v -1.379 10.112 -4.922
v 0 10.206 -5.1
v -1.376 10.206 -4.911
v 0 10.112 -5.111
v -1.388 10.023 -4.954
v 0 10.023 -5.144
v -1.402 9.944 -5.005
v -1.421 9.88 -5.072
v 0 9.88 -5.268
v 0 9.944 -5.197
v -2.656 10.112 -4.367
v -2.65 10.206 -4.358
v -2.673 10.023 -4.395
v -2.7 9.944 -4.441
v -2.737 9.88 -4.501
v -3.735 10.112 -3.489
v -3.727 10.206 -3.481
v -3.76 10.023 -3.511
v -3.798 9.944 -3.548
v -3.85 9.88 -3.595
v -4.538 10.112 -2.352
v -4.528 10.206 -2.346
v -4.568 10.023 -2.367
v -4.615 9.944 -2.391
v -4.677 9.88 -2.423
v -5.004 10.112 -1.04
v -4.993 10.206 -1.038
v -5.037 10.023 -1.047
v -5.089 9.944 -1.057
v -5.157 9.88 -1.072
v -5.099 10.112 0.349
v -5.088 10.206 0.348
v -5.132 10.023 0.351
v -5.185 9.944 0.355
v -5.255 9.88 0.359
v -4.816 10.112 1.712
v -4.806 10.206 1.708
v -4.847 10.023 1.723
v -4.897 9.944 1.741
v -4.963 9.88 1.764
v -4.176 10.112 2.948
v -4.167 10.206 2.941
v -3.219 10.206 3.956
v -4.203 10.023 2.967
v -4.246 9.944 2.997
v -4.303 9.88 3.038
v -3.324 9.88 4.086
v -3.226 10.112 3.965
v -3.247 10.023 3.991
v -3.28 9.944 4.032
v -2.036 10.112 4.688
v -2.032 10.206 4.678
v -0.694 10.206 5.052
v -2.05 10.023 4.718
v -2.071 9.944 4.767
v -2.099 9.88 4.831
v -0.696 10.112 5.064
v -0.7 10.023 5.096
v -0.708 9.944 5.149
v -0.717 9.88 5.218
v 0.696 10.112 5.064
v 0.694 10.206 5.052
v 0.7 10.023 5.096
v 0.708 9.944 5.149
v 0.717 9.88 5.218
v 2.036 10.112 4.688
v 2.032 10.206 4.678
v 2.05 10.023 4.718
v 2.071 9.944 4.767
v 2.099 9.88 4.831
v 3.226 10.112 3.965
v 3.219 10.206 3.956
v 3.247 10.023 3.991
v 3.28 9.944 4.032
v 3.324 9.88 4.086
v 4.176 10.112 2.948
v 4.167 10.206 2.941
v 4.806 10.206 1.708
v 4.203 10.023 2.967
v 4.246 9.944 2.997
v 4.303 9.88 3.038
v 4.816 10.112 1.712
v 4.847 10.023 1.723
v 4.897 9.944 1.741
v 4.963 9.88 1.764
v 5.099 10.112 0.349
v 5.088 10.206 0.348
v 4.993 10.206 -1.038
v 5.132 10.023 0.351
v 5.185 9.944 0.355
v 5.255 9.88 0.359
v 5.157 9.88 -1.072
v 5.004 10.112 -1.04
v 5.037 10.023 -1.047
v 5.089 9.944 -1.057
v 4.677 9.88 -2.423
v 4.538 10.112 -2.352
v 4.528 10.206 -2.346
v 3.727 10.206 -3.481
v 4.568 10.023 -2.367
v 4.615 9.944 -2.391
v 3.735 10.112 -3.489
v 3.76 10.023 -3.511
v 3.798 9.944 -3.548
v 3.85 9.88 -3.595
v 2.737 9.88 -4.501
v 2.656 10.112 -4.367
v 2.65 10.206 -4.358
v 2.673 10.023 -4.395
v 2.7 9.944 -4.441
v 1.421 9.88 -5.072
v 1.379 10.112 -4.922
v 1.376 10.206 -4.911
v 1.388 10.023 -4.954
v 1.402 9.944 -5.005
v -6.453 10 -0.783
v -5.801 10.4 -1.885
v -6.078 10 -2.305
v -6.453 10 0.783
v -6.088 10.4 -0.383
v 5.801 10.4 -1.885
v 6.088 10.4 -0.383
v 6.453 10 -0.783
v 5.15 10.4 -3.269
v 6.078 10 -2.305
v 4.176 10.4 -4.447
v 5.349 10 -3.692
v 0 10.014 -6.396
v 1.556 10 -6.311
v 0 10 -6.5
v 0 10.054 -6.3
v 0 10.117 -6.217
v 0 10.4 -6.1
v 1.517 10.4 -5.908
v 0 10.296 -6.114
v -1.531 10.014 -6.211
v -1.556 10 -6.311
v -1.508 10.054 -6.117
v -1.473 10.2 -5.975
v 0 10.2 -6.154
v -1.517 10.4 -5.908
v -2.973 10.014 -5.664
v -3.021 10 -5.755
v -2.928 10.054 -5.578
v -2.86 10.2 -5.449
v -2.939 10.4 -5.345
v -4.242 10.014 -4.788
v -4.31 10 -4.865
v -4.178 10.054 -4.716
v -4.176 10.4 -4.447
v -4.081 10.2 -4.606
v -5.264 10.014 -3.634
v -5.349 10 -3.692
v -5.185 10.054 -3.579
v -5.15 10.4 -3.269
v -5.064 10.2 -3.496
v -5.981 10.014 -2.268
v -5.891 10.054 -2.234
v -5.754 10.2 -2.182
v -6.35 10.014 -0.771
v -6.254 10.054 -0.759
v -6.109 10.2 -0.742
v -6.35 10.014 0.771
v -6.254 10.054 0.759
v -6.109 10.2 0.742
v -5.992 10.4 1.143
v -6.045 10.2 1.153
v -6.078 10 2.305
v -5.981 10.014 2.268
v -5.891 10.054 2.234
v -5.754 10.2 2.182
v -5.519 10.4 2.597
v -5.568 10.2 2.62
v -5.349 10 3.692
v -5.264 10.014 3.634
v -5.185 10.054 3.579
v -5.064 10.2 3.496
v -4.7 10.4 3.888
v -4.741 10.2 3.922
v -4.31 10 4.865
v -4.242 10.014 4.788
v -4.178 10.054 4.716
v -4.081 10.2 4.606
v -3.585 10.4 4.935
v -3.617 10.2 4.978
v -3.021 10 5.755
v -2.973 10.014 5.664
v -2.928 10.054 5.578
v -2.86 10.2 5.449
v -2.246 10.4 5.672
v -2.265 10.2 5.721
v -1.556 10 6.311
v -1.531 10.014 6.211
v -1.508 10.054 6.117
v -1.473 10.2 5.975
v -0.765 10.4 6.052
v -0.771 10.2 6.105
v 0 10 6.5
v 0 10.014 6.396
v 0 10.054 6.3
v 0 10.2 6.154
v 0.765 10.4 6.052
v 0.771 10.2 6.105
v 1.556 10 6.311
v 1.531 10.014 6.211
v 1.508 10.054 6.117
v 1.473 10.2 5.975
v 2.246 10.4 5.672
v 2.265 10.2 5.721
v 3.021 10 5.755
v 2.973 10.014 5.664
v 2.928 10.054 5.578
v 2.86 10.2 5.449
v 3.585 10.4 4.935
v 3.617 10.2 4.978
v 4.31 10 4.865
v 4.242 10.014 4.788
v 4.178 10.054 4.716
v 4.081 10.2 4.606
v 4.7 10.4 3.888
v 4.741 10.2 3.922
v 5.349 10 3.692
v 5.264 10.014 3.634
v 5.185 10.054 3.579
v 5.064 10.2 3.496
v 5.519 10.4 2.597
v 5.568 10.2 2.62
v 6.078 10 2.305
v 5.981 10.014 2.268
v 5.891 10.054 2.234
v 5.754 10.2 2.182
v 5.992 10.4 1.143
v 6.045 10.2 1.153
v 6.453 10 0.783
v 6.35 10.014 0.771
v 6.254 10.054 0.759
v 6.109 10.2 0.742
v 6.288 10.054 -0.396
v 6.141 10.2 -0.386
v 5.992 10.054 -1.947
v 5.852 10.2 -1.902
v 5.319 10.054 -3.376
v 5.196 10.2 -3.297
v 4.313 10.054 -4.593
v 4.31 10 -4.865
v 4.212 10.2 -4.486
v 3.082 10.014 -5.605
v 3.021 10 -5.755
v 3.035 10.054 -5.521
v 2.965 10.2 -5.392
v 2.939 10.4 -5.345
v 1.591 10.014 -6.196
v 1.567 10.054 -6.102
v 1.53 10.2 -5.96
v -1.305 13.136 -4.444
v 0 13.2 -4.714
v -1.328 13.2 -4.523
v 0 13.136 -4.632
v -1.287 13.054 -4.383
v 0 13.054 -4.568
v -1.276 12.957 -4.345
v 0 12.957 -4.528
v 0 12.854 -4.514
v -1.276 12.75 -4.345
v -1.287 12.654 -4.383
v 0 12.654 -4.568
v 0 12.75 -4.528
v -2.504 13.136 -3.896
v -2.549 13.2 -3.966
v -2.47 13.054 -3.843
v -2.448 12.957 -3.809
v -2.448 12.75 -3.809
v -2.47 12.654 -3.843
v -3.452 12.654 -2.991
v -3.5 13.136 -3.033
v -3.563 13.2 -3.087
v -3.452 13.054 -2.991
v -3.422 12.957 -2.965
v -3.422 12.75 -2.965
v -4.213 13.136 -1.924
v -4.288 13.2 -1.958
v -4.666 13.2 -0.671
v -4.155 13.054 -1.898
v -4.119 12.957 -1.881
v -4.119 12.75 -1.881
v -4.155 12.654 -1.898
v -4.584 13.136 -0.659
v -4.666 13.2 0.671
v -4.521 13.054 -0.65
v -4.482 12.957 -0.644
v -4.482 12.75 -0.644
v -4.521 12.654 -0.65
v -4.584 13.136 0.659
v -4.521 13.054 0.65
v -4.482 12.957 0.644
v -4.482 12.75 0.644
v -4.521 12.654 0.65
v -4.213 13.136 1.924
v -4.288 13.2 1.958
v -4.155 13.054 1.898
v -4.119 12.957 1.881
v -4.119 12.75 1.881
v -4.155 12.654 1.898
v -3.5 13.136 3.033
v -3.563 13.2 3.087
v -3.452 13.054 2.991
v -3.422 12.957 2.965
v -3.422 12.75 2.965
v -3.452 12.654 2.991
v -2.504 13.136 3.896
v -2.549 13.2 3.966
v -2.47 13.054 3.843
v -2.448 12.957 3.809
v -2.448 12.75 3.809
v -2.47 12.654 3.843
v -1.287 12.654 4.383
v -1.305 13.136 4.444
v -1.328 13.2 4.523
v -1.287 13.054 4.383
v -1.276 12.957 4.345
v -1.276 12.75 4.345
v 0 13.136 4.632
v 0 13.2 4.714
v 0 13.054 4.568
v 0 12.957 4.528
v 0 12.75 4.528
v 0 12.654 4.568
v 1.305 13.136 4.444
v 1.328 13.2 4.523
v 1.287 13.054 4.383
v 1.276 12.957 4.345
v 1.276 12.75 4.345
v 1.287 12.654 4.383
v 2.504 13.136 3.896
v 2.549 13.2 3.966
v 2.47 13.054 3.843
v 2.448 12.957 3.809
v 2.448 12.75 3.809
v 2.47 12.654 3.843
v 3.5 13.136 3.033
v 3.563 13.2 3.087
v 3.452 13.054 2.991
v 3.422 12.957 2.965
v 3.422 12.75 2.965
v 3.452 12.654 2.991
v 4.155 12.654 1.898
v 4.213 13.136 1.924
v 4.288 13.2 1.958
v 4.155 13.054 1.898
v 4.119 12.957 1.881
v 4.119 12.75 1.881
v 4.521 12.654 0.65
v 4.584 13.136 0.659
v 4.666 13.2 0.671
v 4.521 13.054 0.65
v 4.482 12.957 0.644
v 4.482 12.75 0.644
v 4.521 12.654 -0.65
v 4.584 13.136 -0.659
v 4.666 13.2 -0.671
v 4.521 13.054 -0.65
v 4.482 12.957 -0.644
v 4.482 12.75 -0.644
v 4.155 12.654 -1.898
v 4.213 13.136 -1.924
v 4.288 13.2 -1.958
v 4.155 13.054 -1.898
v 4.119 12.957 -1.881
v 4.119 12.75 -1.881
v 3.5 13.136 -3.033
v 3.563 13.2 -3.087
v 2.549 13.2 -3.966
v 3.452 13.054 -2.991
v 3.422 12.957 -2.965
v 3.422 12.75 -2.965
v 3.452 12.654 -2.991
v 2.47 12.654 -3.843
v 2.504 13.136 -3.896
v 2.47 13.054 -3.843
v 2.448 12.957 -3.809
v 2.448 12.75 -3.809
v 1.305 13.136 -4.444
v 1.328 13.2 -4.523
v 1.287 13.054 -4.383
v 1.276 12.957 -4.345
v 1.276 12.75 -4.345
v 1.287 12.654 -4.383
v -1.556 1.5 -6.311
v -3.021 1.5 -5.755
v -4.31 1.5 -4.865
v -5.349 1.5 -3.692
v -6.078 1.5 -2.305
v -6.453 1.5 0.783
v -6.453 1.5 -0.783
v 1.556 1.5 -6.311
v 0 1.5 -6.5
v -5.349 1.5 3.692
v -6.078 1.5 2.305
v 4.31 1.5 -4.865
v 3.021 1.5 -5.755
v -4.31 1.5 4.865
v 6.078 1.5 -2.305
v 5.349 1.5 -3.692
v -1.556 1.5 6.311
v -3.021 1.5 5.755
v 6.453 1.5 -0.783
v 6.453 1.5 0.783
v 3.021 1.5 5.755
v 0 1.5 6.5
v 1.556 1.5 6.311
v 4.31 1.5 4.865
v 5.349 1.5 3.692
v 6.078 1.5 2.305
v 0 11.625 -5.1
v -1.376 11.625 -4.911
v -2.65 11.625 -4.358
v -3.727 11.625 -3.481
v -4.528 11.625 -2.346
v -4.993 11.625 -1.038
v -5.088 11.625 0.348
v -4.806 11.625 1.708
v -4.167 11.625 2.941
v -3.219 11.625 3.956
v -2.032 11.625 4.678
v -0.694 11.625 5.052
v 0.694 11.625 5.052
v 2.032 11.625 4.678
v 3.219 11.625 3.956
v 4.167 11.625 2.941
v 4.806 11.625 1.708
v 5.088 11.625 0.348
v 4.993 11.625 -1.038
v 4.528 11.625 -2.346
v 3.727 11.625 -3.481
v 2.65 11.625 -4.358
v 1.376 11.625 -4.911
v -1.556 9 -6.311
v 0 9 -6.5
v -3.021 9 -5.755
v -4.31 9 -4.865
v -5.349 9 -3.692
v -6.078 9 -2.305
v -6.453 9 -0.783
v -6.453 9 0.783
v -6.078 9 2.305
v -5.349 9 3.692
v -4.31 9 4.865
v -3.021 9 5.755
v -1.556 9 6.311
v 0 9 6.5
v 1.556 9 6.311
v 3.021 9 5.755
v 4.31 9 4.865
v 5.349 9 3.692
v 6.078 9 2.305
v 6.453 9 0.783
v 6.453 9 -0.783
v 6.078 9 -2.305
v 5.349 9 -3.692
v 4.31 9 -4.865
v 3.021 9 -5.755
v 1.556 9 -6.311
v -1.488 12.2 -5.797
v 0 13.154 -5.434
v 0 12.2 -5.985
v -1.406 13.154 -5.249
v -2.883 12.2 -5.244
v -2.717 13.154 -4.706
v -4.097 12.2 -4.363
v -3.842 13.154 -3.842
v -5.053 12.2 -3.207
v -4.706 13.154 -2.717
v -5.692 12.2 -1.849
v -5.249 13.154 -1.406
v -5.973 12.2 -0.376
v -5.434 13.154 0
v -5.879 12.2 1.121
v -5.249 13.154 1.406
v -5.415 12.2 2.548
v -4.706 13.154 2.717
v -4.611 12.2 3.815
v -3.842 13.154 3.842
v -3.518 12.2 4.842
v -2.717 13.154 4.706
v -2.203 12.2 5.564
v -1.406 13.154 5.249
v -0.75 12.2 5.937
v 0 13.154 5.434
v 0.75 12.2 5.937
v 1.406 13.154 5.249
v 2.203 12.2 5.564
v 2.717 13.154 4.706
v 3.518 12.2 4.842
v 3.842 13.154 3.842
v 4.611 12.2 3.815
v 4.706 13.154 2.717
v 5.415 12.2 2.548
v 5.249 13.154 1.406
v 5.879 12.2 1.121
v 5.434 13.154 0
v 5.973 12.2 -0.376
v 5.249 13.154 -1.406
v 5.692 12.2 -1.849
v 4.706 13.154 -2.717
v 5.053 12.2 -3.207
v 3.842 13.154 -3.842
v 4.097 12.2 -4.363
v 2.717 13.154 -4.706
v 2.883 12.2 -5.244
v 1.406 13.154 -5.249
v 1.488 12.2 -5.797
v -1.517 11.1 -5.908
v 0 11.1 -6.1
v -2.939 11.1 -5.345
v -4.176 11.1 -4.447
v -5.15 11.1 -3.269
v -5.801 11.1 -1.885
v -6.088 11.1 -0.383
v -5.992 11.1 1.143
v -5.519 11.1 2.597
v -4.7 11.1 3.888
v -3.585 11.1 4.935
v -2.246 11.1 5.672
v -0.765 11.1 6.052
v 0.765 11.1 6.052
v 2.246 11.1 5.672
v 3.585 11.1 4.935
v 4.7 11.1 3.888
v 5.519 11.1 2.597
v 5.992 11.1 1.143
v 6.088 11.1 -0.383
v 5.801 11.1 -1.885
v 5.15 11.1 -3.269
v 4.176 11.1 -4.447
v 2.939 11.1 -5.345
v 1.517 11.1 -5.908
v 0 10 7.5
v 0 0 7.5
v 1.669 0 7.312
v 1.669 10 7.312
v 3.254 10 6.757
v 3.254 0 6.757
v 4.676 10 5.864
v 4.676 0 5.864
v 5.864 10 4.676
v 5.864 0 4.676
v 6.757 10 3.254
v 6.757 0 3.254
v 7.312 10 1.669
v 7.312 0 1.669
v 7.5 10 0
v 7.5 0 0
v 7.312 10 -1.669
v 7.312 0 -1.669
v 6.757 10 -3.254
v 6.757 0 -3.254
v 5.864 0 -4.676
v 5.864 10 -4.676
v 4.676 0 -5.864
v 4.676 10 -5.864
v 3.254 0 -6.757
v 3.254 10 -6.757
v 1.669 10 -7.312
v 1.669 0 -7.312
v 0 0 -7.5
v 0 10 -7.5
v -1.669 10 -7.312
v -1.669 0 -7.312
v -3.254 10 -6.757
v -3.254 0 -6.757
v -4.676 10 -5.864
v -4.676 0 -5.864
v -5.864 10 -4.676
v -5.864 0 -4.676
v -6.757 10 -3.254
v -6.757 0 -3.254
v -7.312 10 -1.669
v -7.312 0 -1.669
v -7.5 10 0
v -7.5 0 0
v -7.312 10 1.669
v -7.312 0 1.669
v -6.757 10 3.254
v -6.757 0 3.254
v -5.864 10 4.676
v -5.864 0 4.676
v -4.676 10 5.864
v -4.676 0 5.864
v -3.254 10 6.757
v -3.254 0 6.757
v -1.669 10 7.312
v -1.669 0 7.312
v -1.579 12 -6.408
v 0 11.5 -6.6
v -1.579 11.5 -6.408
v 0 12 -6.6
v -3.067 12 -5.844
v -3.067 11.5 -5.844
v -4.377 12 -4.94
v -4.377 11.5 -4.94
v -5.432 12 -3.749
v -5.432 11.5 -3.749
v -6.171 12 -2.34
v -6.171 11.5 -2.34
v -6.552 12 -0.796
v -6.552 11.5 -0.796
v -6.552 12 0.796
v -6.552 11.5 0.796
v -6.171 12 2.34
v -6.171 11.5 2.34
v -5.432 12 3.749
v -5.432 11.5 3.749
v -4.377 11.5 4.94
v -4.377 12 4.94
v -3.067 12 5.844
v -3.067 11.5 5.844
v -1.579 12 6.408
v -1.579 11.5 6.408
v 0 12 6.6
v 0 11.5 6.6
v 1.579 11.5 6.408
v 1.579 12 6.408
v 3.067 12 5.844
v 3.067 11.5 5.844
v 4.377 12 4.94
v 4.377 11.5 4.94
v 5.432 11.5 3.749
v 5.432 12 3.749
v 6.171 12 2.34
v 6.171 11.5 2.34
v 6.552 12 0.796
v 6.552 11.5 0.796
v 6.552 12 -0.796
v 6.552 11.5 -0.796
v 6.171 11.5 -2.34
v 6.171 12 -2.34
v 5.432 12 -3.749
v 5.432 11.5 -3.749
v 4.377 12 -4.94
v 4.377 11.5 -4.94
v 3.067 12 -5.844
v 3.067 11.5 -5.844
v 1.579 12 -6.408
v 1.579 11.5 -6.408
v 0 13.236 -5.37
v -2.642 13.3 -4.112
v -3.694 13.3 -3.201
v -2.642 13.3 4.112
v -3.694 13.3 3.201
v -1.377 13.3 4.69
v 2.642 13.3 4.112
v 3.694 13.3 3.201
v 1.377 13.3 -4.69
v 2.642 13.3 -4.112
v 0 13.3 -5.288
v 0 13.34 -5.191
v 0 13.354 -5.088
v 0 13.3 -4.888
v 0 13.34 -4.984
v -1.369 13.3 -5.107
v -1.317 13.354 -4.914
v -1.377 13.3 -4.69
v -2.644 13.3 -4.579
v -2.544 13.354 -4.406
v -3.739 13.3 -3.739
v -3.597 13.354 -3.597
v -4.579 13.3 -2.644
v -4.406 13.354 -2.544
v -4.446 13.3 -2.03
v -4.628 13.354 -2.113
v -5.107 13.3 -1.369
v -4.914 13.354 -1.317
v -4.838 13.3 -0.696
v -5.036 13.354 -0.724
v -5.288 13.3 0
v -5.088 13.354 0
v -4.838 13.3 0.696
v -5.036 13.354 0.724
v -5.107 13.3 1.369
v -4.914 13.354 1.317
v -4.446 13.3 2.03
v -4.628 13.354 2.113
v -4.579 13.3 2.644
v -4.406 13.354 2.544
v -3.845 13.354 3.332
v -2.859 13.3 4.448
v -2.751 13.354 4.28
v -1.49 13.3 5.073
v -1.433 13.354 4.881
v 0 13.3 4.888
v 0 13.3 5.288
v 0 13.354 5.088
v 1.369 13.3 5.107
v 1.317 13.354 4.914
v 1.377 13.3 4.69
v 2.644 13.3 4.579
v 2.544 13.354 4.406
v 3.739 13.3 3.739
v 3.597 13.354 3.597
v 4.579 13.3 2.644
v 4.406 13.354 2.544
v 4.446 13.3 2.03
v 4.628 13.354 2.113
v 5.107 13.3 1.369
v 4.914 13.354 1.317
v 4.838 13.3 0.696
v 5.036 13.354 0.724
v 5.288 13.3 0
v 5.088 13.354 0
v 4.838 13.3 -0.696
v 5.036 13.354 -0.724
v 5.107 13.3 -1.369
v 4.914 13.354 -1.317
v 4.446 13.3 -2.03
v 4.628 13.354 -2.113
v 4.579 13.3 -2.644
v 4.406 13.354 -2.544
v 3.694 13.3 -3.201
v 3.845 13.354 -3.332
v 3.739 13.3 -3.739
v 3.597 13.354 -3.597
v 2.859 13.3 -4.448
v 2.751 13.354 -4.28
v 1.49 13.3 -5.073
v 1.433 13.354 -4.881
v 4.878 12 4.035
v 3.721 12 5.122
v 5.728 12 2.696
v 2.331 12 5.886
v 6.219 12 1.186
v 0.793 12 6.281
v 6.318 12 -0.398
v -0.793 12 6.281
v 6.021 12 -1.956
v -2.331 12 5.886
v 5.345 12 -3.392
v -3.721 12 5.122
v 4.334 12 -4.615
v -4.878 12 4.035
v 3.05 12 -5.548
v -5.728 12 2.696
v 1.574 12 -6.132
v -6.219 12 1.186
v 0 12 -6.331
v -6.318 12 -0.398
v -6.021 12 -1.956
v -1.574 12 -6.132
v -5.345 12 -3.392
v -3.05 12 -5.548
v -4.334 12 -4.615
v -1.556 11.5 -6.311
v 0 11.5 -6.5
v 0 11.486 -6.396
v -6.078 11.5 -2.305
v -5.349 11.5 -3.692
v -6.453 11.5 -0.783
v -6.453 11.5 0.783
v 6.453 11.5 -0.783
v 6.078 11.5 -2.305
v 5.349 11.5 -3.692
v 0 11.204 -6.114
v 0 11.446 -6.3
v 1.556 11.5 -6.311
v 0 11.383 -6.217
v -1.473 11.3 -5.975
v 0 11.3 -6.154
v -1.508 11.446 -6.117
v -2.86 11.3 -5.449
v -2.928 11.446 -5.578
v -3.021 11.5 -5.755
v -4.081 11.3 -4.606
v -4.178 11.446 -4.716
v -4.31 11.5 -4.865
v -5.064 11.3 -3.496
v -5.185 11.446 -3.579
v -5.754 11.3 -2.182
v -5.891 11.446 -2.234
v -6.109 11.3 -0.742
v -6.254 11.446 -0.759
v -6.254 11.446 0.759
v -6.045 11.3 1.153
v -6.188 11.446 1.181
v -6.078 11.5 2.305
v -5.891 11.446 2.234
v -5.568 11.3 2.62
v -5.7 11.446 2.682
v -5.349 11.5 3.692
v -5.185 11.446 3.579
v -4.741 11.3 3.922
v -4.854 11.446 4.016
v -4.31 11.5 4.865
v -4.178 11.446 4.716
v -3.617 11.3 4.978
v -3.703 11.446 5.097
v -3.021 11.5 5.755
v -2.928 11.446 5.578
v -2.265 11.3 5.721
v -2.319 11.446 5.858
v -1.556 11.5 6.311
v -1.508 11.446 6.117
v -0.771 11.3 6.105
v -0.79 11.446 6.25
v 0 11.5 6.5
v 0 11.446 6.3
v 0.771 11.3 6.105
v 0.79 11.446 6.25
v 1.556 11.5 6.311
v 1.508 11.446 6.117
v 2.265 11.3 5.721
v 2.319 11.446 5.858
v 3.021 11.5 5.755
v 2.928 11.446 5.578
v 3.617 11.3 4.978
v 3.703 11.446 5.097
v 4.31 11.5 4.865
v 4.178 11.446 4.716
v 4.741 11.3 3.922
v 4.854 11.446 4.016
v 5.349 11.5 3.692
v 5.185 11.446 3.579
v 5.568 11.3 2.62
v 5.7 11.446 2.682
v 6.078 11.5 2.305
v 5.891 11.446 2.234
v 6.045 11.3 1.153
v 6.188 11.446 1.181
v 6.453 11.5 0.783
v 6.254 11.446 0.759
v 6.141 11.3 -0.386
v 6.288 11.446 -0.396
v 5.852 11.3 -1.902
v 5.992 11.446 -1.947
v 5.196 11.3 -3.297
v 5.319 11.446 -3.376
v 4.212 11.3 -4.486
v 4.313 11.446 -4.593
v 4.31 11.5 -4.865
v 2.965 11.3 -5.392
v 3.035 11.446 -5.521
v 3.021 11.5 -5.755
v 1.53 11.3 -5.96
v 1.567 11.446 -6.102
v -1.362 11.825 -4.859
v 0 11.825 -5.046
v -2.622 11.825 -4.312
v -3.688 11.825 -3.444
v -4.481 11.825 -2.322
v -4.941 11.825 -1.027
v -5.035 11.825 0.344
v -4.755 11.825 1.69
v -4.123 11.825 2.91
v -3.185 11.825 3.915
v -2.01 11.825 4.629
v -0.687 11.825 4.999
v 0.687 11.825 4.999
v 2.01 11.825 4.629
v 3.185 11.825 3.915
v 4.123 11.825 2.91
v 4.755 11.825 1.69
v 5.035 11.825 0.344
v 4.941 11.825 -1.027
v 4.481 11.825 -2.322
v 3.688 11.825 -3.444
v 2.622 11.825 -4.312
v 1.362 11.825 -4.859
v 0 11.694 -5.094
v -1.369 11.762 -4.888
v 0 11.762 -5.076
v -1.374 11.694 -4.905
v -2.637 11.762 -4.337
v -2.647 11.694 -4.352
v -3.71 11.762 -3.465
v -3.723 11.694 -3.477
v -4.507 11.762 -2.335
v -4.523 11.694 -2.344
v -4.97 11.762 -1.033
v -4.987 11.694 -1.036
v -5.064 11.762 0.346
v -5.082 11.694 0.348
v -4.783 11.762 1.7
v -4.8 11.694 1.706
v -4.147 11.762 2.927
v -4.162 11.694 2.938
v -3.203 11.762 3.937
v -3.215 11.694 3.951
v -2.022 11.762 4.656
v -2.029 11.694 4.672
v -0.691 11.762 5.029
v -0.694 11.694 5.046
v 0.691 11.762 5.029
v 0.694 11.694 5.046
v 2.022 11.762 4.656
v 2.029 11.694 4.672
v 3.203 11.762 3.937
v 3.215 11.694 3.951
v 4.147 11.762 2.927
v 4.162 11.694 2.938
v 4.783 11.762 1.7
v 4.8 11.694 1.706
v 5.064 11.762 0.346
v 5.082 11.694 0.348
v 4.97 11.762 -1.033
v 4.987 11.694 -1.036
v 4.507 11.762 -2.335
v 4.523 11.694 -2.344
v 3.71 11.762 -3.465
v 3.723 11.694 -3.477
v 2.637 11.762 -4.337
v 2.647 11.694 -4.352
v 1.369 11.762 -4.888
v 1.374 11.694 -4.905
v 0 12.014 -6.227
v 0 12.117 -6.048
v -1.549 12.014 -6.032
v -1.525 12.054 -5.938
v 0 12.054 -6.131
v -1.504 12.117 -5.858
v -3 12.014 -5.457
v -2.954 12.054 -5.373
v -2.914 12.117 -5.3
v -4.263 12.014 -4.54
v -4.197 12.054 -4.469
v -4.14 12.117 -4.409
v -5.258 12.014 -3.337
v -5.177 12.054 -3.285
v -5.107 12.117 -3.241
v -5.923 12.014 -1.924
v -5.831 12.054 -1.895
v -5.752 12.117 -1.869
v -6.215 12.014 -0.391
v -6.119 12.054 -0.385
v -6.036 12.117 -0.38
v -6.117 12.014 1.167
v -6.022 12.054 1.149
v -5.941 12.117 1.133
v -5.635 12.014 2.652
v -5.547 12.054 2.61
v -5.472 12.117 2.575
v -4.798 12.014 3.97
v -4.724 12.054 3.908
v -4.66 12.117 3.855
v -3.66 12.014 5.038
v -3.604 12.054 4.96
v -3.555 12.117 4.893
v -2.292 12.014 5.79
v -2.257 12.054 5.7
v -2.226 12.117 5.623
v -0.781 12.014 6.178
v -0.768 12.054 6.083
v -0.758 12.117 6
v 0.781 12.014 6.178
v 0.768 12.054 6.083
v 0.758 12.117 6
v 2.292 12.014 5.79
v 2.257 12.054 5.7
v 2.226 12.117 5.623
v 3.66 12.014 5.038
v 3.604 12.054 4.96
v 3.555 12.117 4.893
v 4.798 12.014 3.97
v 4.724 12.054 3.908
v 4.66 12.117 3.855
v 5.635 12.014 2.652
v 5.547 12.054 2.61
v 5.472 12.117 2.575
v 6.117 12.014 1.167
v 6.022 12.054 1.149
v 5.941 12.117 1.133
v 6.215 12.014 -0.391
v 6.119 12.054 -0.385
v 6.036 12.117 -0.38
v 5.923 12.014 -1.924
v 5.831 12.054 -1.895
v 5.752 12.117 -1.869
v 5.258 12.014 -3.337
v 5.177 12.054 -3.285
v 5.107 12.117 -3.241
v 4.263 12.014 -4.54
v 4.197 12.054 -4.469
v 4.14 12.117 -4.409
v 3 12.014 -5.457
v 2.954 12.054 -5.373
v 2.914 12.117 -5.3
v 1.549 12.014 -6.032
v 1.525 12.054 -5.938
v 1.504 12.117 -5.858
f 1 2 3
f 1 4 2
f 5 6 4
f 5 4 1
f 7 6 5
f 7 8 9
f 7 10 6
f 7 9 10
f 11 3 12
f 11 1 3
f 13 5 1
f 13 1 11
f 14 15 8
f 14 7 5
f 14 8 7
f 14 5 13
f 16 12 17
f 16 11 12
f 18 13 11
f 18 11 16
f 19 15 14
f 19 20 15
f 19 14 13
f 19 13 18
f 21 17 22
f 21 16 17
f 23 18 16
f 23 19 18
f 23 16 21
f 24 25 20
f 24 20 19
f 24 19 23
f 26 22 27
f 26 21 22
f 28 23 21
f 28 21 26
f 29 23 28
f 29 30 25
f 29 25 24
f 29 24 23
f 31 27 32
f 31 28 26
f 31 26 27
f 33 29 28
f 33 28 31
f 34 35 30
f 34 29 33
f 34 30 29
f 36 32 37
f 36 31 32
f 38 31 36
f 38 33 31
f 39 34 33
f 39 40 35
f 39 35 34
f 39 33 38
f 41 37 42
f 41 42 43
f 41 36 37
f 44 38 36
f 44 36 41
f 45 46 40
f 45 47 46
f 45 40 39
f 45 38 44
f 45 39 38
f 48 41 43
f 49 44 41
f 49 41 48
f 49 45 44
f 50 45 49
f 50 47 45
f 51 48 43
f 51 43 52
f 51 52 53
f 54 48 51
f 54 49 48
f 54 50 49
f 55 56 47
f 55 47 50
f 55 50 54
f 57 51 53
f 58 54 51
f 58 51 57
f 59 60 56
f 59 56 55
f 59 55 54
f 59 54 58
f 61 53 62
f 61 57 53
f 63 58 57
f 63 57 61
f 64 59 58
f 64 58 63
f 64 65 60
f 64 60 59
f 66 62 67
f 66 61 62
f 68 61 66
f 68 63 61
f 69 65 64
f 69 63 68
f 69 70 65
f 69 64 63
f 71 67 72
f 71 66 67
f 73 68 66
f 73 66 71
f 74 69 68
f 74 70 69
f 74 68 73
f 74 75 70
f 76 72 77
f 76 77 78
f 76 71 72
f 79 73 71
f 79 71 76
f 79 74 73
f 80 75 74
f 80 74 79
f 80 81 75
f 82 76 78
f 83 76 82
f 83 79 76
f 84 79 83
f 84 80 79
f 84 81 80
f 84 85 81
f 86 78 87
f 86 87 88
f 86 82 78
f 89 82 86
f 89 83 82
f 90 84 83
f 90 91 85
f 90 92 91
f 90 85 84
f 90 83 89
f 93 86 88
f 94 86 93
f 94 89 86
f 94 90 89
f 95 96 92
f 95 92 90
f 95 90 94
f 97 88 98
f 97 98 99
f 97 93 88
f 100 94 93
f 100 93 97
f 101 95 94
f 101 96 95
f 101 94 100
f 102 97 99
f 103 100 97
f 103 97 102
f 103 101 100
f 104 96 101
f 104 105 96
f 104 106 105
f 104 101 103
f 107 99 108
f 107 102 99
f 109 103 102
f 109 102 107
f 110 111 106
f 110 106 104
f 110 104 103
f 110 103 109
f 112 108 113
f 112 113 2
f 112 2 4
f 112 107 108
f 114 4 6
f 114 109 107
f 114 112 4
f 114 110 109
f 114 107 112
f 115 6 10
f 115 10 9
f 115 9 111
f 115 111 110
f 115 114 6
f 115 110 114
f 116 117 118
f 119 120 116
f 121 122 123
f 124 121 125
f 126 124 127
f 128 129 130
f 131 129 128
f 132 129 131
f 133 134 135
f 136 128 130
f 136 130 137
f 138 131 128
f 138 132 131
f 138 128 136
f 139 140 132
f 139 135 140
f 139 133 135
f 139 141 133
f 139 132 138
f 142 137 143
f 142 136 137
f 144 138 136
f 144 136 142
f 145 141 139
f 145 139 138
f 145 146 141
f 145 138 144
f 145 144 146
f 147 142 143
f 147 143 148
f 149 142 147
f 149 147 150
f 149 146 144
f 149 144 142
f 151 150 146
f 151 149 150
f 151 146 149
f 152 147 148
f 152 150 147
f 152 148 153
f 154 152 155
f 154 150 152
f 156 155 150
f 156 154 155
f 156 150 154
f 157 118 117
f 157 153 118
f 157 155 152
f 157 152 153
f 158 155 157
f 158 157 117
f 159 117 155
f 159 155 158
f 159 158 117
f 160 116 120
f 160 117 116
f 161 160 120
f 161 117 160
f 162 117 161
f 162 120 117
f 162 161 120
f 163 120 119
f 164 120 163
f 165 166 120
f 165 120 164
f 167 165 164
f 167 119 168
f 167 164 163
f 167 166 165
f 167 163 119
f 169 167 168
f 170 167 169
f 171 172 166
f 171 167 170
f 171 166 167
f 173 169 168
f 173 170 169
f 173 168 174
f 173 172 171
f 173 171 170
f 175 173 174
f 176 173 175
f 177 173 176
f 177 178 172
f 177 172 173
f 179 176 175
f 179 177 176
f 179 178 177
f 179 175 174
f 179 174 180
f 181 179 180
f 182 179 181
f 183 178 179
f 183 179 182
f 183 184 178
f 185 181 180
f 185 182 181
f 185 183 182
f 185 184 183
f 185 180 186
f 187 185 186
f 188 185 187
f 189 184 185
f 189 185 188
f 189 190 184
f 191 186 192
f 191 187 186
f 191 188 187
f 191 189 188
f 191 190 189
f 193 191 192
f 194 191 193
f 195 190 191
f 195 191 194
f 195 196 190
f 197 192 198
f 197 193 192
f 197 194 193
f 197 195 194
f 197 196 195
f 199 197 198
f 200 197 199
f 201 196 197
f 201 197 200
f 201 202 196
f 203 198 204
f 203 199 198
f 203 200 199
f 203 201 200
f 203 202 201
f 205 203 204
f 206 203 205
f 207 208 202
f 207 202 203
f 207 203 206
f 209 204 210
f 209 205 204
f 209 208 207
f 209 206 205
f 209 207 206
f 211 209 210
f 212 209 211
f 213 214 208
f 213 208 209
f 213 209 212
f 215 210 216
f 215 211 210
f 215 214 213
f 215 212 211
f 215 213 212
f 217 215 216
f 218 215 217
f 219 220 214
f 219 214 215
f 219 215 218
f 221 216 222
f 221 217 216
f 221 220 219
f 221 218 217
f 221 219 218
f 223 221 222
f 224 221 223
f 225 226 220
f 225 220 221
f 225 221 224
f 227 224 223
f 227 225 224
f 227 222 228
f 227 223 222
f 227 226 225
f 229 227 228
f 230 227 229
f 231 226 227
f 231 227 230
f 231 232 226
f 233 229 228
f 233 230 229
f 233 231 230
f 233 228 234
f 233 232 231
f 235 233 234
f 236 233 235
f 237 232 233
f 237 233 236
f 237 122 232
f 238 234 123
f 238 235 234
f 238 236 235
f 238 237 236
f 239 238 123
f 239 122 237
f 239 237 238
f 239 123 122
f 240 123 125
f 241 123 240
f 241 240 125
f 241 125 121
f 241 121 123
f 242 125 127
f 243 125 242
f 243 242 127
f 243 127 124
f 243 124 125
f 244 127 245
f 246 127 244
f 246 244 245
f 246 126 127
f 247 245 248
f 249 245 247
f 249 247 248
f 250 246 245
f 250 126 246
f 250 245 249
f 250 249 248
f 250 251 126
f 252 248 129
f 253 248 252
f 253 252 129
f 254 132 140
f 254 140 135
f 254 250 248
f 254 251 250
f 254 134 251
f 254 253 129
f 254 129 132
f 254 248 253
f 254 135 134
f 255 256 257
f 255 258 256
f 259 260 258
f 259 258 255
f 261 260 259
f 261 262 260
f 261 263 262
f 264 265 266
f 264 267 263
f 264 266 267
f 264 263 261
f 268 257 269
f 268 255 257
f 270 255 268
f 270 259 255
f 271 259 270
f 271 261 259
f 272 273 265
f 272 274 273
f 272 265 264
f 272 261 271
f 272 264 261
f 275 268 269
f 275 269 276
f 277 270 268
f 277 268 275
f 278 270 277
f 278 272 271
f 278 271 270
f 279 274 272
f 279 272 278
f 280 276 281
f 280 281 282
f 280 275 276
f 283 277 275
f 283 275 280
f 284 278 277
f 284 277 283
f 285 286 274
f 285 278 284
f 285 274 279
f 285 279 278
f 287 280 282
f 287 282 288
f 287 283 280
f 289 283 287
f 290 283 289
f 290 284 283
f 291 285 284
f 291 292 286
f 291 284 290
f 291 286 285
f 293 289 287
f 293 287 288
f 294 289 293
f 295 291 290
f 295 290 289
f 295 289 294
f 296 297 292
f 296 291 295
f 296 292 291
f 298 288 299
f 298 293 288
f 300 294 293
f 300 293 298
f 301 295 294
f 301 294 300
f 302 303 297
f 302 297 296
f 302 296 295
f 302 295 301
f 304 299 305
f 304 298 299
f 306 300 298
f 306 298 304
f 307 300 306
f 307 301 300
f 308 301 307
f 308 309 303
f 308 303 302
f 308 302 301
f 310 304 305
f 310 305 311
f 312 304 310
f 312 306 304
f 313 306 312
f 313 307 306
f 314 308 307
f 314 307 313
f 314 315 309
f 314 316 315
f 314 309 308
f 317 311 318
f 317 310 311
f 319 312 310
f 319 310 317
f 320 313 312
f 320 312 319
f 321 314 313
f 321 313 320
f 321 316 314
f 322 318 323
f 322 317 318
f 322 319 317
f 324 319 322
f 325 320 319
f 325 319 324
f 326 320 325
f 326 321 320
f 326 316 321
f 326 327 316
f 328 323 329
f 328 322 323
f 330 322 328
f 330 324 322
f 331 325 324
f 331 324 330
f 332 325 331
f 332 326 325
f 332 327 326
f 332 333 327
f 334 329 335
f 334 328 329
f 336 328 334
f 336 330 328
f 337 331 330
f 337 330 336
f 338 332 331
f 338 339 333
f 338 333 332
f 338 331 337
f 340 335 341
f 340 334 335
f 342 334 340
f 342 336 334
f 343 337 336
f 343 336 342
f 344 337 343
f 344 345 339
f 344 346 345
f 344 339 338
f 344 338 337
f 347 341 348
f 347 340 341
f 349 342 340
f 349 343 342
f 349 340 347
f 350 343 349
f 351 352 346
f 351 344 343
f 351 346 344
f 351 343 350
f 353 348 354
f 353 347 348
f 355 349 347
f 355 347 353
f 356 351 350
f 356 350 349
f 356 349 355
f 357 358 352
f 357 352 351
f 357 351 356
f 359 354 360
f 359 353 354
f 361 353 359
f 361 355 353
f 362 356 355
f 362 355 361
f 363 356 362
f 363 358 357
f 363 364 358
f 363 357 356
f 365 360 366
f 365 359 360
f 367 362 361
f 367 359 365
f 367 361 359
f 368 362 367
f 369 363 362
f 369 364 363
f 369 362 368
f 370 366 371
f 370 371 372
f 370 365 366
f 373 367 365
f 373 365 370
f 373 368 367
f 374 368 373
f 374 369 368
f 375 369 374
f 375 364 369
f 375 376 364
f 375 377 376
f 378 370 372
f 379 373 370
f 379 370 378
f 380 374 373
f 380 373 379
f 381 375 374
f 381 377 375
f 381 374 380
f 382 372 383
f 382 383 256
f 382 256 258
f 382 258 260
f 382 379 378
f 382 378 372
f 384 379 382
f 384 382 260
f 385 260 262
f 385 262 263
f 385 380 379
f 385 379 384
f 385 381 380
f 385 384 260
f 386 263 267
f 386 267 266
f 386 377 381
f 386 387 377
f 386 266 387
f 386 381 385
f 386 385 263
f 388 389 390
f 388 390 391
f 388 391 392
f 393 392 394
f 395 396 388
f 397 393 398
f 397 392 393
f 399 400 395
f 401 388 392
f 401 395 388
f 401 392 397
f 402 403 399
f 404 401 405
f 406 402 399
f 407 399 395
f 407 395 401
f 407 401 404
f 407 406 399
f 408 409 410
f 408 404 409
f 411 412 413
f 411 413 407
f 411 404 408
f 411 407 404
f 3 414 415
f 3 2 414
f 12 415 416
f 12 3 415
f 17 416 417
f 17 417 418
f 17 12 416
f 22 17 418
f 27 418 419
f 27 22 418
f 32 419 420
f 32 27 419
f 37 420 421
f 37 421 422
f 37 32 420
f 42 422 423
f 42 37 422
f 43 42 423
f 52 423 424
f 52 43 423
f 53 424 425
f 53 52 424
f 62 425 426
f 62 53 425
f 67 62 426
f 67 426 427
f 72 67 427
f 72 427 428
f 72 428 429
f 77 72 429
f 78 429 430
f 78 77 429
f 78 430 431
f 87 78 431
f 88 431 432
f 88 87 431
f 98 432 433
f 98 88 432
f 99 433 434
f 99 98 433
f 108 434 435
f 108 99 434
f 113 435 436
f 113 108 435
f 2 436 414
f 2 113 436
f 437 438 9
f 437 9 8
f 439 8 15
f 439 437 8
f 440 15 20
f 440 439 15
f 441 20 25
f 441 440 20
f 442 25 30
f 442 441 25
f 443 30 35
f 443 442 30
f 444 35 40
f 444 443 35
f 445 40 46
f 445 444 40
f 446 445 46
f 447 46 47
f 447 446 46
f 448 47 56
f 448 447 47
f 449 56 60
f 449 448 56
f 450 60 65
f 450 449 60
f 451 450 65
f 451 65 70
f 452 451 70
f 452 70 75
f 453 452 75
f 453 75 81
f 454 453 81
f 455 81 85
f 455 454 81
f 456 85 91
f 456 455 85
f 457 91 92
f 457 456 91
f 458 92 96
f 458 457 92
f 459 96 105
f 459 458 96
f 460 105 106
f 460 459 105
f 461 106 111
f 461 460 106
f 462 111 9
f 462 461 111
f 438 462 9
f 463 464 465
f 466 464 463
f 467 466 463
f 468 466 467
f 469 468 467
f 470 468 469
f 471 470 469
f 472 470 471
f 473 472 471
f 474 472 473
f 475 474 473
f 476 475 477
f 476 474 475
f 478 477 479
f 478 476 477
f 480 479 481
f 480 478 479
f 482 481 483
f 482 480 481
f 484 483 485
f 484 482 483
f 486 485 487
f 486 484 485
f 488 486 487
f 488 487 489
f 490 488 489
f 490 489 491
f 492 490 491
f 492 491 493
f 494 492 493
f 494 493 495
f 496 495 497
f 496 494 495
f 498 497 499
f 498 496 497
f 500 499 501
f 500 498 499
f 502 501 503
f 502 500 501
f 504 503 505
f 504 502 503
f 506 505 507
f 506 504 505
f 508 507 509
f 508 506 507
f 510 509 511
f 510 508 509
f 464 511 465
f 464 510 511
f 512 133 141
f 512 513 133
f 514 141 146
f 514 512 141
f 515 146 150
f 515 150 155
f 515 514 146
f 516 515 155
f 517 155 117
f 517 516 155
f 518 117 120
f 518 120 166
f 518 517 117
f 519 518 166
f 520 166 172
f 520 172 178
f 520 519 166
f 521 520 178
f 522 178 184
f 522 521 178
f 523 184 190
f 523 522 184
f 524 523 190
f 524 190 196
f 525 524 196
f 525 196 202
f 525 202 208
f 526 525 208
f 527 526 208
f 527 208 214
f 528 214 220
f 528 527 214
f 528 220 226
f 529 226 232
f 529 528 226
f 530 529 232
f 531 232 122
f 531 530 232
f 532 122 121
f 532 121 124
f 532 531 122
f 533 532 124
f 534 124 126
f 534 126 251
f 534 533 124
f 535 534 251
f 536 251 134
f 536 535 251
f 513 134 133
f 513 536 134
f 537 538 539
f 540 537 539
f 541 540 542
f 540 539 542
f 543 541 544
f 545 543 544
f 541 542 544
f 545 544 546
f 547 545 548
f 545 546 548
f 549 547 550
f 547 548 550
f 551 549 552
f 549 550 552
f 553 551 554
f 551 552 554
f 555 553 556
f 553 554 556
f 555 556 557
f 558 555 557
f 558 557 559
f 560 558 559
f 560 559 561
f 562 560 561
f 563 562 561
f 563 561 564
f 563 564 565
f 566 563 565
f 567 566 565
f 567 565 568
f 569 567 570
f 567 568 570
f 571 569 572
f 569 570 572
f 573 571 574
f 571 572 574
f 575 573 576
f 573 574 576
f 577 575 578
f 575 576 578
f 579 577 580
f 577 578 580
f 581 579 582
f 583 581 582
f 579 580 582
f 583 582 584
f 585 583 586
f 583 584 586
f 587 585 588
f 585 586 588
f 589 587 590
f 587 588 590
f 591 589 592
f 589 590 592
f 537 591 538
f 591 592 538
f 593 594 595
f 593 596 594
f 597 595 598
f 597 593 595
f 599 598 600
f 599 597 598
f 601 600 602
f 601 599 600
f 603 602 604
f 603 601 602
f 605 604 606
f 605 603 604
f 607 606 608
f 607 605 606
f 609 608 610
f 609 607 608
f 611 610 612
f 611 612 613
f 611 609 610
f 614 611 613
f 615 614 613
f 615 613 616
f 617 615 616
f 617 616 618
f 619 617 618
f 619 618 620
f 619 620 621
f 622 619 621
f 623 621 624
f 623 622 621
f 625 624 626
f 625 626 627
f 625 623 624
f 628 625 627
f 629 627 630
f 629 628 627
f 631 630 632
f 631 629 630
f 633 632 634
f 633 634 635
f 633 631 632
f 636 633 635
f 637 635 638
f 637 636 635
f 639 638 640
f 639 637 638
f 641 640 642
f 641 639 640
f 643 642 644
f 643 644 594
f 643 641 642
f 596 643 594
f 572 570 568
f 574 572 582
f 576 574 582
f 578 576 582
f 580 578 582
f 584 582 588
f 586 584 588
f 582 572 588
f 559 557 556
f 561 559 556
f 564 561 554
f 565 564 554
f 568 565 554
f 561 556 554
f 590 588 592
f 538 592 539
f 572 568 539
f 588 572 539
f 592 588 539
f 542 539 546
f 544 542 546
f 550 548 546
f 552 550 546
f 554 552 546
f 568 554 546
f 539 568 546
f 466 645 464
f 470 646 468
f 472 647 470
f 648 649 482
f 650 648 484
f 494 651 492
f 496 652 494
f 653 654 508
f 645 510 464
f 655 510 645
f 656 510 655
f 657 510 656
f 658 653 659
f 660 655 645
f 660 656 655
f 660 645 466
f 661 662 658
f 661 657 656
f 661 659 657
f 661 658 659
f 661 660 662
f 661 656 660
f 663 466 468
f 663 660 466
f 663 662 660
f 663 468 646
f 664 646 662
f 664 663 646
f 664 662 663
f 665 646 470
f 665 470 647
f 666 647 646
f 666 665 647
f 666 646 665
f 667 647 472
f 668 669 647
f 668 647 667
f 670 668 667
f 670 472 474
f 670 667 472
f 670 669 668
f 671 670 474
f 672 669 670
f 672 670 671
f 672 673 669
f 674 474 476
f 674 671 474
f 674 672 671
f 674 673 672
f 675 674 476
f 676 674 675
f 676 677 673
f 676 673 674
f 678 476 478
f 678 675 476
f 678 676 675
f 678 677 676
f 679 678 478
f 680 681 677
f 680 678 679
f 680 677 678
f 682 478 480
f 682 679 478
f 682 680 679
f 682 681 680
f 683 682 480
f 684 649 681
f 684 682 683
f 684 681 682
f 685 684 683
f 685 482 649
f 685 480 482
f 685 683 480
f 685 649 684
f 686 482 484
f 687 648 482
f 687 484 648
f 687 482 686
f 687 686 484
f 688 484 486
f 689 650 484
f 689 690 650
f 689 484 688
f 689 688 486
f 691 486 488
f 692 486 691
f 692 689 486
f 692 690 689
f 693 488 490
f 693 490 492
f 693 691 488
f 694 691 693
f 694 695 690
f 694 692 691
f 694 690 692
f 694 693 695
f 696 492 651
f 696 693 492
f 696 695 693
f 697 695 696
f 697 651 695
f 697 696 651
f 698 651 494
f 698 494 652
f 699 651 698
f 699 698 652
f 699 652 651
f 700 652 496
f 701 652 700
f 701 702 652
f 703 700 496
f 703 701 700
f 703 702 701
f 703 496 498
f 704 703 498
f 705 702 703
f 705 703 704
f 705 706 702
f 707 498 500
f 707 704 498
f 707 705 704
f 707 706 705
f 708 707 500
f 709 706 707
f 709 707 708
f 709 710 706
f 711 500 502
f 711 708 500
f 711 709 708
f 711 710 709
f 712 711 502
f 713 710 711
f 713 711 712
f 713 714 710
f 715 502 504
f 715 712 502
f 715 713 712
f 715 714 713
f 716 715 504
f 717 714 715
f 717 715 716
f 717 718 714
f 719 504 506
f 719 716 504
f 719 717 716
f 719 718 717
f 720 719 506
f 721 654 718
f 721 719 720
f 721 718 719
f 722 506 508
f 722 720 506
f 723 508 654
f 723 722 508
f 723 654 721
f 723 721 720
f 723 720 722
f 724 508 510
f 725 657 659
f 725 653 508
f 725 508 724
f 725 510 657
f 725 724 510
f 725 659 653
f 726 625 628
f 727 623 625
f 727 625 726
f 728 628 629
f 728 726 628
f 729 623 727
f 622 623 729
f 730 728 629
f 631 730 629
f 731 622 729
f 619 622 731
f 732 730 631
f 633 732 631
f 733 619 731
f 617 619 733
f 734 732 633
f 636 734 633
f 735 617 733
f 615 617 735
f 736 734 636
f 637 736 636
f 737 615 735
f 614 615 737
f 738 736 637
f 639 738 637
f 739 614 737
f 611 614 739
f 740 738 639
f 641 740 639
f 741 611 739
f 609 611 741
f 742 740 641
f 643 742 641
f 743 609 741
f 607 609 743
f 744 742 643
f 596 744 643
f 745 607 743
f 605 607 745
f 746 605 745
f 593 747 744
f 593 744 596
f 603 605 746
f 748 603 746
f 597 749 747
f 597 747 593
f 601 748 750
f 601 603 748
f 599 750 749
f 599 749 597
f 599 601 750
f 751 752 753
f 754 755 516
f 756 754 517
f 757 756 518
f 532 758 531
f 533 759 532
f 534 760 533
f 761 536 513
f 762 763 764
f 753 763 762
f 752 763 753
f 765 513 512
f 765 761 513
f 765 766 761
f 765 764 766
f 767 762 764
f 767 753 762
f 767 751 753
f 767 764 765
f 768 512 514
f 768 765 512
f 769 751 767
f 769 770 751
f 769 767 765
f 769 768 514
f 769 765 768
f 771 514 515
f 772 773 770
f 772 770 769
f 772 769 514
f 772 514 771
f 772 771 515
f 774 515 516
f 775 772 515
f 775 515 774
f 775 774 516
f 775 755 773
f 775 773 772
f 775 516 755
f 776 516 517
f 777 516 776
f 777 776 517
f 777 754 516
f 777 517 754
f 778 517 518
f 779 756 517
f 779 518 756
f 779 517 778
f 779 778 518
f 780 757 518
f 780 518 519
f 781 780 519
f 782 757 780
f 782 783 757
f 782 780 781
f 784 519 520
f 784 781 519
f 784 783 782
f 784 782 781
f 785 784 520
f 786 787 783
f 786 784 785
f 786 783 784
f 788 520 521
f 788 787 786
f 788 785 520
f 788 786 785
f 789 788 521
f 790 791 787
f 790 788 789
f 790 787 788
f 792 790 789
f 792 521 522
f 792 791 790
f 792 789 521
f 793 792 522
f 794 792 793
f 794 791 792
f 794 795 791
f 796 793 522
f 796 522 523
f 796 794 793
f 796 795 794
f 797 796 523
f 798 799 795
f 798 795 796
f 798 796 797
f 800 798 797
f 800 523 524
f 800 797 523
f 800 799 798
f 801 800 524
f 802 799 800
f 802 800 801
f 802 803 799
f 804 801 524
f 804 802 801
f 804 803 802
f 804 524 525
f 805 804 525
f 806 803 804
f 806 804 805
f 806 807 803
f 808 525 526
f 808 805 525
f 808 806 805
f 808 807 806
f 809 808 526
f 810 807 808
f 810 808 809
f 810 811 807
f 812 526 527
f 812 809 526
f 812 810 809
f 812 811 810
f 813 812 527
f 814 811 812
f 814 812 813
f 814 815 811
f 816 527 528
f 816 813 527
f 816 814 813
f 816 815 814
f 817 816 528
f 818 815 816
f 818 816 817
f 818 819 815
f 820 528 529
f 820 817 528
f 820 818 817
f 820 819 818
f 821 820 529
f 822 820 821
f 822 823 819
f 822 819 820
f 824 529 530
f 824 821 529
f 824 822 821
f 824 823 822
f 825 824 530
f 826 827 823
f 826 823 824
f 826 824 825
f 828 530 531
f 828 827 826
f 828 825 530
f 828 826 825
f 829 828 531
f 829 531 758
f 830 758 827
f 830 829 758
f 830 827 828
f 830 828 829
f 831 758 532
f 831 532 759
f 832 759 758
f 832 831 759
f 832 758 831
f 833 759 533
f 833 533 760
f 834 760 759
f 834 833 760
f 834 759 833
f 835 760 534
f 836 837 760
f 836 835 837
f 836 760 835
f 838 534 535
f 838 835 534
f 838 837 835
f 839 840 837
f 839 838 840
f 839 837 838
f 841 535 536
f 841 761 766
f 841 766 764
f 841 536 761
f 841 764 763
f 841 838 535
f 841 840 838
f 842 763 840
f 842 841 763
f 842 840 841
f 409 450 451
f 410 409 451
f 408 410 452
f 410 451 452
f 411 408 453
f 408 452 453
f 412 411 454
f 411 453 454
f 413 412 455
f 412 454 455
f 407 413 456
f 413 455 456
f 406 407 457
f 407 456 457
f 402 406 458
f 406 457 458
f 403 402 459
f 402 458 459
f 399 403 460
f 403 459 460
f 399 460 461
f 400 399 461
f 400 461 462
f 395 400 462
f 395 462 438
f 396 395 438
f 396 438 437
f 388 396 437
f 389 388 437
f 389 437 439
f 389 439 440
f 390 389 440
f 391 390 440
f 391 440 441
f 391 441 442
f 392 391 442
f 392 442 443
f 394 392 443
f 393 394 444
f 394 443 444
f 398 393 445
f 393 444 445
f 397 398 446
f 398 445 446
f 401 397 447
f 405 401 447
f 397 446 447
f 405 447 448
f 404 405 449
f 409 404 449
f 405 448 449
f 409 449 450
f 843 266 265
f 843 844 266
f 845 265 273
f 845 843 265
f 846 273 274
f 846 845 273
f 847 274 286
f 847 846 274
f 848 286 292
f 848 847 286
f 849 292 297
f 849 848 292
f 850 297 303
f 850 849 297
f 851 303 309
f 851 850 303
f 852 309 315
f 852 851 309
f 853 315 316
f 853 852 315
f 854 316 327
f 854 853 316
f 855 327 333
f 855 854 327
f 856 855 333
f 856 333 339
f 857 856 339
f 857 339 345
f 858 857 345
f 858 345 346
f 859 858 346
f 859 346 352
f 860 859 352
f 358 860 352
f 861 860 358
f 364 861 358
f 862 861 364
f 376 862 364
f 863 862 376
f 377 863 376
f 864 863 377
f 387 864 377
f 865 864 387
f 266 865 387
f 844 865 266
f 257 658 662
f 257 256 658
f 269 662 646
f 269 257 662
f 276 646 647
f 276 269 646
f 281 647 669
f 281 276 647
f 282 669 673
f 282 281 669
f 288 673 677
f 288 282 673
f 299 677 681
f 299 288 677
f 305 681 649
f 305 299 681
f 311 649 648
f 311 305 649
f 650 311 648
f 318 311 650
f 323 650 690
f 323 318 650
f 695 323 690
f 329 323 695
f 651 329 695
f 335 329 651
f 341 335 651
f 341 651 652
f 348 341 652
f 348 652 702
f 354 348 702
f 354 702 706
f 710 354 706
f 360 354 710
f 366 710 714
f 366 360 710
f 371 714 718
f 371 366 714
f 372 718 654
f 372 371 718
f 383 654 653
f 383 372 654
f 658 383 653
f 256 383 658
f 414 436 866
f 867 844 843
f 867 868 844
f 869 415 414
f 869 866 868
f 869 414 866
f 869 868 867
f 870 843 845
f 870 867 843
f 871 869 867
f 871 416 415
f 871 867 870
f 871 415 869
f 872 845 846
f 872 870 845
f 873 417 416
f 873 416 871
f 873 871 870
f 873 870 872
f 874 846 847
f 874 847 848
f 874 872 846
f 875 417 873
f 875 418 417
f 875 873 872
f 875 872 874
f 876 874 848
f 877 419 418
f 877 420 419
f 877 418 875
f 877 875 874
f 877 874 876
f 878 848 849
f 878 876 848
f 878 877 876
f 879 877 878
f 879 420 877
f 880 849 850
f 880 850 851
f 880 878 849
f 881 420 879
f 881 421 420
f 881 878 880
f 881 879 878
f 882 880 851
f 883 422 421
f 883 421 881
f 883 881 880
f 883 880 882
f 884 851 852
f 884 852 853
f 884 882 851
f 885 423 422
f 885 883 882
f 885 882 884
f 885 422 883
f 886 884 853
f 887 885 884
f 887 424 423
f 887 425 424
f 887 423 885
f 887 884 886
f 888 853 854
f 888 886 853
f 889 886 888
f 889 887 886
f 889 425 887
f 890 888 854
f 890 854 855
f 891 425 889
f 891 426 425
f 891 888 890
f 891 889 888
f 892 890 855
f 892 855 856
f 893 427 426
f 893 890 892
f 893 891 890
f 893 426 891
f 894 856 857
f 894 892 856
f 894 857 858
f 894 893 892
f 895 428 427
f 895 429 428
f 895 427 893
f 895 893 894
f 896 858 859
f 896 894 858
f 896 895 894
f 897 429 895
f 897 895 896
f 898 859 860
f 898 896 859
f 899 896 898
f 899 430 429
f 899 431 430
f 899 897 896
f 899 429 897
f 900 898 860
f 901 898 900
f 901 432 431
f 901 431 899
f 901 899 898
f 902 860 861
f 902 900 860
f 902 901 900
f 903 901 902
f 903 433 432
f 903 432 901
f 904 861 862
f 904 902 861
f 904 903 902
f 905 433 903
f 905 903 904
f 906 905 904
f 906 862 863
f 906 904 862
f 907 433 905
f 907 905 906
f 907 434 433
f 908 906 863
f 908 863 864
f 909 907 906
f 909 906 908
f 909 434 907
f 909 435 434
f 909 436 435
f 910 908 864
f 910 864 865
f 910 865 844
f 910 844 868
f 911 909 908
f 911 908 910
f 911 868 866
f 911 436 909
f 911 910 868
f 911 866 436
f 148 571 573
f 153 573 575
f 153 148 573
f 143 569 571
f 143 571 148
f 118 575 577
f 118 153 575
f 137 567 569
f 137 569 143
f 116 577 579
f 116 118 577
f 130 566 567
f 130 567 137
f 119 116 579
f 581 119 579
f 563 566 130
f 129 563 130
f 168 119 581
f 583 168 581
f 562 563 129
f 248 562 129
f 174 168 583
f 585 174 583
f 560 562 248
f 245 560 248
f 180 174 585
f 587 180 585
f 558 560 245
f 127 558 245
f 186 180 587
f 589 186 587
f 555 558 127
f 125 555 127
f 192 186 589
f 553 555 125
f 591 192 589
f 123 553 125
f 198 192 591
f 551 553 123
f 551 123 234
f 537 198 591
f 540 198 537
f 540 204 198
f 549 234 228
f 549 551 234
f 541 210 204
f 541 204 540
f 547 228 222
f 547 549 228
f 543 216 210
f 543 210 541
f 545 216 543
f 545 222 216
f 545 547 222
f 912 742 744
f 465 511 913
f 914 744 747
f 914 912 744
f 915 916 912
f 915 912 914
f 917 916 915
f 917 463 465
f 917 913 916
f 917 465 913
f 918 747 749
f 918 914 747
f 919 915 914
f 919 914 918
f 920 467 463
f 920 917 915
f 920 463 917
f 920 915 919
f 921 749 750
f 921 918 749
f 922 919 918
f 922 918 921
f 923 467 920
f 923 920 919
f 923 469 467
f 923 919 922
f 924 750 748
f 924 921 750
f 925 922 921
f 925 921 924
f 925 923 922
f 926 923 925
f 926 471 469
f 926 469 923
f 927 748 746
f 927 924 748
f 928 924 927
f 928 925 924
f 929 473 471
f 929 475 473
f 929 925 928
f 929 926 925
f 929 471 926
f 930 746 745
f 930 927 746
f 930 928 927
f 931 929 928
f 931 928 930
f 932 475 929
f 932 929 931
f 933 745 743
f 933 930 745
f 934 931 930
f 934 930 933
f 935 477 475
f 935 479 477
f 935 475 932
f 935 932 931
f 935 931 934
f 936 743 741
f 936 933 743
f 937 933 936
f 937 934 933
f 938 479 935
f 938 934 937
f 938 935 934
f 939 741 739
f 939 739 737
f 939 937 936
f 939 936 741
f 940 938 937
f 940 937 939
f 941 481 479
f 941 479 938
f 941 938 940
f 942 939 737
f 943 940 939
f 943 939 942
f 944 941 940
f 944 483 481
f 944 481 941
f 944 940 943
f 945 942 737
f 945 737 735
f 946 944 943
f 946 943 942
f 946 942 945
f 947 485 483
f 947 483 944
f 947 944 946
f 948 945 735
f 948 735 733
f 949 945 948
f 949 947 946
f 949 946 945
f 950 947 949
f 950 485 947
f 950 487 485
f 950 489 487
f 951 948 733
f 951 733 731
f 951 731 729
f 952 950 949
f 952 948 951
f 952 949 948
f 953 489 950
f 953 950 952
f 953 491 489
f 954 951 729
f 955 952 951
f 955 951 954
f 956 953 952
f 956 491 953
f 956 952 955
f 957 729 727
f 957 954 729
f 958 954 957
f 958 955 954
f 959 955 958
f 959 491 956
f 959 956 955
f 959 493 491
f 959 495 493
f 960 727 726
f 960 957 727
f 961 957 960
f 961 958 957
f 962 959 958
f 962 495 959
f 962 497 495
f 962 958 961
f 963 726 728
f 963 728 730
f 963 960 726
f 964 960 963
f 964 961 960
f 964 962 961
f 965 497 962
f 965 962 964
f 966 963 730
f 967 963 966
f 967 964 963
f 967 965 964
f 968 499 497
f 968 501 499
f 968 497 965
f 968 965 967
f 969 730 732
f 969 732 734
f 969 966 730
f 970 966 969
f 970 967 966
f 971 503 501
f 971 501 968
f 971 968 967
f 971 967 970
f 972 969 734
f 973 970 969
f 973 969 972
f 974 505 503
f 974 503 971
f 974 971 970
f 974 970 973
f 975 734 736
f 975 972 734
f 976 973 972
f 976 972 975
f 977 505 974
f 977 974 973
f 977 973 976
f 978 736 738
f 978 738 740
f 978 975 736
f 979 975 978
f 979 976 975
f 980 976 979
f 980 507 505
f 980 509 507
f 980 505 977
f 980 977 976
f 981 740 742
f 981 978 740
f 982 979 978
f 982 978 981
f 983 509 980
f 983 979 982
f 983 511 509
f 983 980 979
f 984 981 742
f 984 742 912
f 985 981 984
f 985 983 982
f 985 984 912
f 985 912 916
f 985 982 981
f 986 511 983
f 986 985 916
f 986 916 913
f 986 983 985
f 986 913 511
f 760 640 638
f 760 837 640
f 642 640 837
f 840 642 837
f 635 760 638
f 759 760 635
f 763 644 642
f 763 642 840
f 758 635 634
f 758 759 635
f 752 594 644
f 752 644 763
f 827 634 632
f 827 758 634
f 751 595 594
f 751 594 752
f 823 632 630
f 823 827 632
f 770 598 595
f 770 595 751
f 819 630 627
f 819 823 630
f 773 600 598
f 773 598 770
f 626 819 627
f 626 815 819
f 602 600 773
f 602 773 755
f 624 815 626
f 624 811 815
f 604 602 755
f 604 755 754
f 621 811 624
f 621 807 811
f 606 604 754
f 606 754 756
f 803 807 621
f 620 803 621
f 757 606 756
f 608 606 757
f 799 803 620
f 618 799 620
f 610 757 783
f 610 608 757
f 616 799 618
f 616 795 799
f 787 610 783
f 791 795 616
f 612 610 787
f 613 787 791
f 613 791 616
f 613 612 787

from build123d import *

# Parameters (mm, degrees)
SKETCH1_R           = 7.5
BOSS_EXTRUDE1_DEPTH = 10
SKETCH2_R           = 6.5
CUT_EXTRUDE1_DEPTH  = 8.5


with BuildPart() as part:
    # Sketch1 → Boss-Extrude1 (new body)
    with BuildSketch(Plane(origin=(0, 0, 0), x_dir=(1, 0, 0), z_dir=(0, 1, 0))):
        with Locations(Location((0, 0, 0), (0, 0, 270))):
            Circle(SKETCH1_R)
    extrude(amount=BOSS_EXTRUDE1_DEPTH)

    # Sketch2 → Cut-Extrude1 (cut)
    with BuildSketch(Plane(origin=(0, 10, 0), x_dir=(1, 0, 0), z_dir=(0, 1, 0))):
        with Locations(Location((0, 0, 0), (0, 0, 270))):
            Circle(SKETCH2_R)
    extrude(amount=-CUT_EXTRUDE1_DEPTH, mode=Mode.SUBTRACT)

    # Sketch3 → Revolve1 (revolve)
    with BuildSketch(Plane.XY, mode=Mode.PRIVATE) as revolve1_sk:
        with BuildLine():
            Line((-7, 10), (-6.5, 10))
            ThreePointArc((-6.5, 10), (-6.217157288, 10.117157288), (-6.1, 10.4))
            Line((-6.1, 10.4), (-6.1, 11.1))
            ThreePointArc((-6.1, 11.1), (-6.217157288, 11.382842712), (-6.5, 11.5))
            Line((-6.5, 11.5), (-6.6, 11.5))
            Line((-6.6, 11.5), (-6.6, 12))
            Line((-6.6, 12), (-6.330940108, 12))
            ThreePointArc((-6.330940108, 12), (-6.130940108, 12.053589838), (-5.984529946, 12.2))
            Line((-5.984529946, 12.2), (-5.433974596, 13.153589838))
            ThreePointArc((-5.433974596, 13.153589838), (-5.191092053, 13.339960169), (-4.887564435, 13.3))
            Line((-4.887564435, 13.3), (-4.714359354, 13.2))
            ThreePointArc((-4.714359354, 13.2), (-4.527989023, 12.957117457), (-4.567949192, 12.653589838))
            Line((-4.567949192, 12.653589838), (-5.046410162, 11.824871131))
            ThreePointArc((-5.046410162, 11.824871131), (-5.086370331, 11.728398749), (-5.1, 11.624871131))
            Line((-5.1, 11.624871131), (-5.1, 10.205847158))
            ThreePointArc((-5.1, 10.205847158), (-5.144332943, 10.022814526), (-5.267504723, 9.88035377))
            Line((-5.267504723, 9.88035377), (-6.5, 9))
            Line((-6.5, 9), (-7, 9))
            Line((-7, 9), (-7, 10))
        make_face()
    revolve(revolve1_sk.sketch.rotate(Axis((0, 1.5, 0), (0, 1, 0)), 270), axis=Axis((0, 1.5, 0), (0, 1, 0)))


solid = part.part
